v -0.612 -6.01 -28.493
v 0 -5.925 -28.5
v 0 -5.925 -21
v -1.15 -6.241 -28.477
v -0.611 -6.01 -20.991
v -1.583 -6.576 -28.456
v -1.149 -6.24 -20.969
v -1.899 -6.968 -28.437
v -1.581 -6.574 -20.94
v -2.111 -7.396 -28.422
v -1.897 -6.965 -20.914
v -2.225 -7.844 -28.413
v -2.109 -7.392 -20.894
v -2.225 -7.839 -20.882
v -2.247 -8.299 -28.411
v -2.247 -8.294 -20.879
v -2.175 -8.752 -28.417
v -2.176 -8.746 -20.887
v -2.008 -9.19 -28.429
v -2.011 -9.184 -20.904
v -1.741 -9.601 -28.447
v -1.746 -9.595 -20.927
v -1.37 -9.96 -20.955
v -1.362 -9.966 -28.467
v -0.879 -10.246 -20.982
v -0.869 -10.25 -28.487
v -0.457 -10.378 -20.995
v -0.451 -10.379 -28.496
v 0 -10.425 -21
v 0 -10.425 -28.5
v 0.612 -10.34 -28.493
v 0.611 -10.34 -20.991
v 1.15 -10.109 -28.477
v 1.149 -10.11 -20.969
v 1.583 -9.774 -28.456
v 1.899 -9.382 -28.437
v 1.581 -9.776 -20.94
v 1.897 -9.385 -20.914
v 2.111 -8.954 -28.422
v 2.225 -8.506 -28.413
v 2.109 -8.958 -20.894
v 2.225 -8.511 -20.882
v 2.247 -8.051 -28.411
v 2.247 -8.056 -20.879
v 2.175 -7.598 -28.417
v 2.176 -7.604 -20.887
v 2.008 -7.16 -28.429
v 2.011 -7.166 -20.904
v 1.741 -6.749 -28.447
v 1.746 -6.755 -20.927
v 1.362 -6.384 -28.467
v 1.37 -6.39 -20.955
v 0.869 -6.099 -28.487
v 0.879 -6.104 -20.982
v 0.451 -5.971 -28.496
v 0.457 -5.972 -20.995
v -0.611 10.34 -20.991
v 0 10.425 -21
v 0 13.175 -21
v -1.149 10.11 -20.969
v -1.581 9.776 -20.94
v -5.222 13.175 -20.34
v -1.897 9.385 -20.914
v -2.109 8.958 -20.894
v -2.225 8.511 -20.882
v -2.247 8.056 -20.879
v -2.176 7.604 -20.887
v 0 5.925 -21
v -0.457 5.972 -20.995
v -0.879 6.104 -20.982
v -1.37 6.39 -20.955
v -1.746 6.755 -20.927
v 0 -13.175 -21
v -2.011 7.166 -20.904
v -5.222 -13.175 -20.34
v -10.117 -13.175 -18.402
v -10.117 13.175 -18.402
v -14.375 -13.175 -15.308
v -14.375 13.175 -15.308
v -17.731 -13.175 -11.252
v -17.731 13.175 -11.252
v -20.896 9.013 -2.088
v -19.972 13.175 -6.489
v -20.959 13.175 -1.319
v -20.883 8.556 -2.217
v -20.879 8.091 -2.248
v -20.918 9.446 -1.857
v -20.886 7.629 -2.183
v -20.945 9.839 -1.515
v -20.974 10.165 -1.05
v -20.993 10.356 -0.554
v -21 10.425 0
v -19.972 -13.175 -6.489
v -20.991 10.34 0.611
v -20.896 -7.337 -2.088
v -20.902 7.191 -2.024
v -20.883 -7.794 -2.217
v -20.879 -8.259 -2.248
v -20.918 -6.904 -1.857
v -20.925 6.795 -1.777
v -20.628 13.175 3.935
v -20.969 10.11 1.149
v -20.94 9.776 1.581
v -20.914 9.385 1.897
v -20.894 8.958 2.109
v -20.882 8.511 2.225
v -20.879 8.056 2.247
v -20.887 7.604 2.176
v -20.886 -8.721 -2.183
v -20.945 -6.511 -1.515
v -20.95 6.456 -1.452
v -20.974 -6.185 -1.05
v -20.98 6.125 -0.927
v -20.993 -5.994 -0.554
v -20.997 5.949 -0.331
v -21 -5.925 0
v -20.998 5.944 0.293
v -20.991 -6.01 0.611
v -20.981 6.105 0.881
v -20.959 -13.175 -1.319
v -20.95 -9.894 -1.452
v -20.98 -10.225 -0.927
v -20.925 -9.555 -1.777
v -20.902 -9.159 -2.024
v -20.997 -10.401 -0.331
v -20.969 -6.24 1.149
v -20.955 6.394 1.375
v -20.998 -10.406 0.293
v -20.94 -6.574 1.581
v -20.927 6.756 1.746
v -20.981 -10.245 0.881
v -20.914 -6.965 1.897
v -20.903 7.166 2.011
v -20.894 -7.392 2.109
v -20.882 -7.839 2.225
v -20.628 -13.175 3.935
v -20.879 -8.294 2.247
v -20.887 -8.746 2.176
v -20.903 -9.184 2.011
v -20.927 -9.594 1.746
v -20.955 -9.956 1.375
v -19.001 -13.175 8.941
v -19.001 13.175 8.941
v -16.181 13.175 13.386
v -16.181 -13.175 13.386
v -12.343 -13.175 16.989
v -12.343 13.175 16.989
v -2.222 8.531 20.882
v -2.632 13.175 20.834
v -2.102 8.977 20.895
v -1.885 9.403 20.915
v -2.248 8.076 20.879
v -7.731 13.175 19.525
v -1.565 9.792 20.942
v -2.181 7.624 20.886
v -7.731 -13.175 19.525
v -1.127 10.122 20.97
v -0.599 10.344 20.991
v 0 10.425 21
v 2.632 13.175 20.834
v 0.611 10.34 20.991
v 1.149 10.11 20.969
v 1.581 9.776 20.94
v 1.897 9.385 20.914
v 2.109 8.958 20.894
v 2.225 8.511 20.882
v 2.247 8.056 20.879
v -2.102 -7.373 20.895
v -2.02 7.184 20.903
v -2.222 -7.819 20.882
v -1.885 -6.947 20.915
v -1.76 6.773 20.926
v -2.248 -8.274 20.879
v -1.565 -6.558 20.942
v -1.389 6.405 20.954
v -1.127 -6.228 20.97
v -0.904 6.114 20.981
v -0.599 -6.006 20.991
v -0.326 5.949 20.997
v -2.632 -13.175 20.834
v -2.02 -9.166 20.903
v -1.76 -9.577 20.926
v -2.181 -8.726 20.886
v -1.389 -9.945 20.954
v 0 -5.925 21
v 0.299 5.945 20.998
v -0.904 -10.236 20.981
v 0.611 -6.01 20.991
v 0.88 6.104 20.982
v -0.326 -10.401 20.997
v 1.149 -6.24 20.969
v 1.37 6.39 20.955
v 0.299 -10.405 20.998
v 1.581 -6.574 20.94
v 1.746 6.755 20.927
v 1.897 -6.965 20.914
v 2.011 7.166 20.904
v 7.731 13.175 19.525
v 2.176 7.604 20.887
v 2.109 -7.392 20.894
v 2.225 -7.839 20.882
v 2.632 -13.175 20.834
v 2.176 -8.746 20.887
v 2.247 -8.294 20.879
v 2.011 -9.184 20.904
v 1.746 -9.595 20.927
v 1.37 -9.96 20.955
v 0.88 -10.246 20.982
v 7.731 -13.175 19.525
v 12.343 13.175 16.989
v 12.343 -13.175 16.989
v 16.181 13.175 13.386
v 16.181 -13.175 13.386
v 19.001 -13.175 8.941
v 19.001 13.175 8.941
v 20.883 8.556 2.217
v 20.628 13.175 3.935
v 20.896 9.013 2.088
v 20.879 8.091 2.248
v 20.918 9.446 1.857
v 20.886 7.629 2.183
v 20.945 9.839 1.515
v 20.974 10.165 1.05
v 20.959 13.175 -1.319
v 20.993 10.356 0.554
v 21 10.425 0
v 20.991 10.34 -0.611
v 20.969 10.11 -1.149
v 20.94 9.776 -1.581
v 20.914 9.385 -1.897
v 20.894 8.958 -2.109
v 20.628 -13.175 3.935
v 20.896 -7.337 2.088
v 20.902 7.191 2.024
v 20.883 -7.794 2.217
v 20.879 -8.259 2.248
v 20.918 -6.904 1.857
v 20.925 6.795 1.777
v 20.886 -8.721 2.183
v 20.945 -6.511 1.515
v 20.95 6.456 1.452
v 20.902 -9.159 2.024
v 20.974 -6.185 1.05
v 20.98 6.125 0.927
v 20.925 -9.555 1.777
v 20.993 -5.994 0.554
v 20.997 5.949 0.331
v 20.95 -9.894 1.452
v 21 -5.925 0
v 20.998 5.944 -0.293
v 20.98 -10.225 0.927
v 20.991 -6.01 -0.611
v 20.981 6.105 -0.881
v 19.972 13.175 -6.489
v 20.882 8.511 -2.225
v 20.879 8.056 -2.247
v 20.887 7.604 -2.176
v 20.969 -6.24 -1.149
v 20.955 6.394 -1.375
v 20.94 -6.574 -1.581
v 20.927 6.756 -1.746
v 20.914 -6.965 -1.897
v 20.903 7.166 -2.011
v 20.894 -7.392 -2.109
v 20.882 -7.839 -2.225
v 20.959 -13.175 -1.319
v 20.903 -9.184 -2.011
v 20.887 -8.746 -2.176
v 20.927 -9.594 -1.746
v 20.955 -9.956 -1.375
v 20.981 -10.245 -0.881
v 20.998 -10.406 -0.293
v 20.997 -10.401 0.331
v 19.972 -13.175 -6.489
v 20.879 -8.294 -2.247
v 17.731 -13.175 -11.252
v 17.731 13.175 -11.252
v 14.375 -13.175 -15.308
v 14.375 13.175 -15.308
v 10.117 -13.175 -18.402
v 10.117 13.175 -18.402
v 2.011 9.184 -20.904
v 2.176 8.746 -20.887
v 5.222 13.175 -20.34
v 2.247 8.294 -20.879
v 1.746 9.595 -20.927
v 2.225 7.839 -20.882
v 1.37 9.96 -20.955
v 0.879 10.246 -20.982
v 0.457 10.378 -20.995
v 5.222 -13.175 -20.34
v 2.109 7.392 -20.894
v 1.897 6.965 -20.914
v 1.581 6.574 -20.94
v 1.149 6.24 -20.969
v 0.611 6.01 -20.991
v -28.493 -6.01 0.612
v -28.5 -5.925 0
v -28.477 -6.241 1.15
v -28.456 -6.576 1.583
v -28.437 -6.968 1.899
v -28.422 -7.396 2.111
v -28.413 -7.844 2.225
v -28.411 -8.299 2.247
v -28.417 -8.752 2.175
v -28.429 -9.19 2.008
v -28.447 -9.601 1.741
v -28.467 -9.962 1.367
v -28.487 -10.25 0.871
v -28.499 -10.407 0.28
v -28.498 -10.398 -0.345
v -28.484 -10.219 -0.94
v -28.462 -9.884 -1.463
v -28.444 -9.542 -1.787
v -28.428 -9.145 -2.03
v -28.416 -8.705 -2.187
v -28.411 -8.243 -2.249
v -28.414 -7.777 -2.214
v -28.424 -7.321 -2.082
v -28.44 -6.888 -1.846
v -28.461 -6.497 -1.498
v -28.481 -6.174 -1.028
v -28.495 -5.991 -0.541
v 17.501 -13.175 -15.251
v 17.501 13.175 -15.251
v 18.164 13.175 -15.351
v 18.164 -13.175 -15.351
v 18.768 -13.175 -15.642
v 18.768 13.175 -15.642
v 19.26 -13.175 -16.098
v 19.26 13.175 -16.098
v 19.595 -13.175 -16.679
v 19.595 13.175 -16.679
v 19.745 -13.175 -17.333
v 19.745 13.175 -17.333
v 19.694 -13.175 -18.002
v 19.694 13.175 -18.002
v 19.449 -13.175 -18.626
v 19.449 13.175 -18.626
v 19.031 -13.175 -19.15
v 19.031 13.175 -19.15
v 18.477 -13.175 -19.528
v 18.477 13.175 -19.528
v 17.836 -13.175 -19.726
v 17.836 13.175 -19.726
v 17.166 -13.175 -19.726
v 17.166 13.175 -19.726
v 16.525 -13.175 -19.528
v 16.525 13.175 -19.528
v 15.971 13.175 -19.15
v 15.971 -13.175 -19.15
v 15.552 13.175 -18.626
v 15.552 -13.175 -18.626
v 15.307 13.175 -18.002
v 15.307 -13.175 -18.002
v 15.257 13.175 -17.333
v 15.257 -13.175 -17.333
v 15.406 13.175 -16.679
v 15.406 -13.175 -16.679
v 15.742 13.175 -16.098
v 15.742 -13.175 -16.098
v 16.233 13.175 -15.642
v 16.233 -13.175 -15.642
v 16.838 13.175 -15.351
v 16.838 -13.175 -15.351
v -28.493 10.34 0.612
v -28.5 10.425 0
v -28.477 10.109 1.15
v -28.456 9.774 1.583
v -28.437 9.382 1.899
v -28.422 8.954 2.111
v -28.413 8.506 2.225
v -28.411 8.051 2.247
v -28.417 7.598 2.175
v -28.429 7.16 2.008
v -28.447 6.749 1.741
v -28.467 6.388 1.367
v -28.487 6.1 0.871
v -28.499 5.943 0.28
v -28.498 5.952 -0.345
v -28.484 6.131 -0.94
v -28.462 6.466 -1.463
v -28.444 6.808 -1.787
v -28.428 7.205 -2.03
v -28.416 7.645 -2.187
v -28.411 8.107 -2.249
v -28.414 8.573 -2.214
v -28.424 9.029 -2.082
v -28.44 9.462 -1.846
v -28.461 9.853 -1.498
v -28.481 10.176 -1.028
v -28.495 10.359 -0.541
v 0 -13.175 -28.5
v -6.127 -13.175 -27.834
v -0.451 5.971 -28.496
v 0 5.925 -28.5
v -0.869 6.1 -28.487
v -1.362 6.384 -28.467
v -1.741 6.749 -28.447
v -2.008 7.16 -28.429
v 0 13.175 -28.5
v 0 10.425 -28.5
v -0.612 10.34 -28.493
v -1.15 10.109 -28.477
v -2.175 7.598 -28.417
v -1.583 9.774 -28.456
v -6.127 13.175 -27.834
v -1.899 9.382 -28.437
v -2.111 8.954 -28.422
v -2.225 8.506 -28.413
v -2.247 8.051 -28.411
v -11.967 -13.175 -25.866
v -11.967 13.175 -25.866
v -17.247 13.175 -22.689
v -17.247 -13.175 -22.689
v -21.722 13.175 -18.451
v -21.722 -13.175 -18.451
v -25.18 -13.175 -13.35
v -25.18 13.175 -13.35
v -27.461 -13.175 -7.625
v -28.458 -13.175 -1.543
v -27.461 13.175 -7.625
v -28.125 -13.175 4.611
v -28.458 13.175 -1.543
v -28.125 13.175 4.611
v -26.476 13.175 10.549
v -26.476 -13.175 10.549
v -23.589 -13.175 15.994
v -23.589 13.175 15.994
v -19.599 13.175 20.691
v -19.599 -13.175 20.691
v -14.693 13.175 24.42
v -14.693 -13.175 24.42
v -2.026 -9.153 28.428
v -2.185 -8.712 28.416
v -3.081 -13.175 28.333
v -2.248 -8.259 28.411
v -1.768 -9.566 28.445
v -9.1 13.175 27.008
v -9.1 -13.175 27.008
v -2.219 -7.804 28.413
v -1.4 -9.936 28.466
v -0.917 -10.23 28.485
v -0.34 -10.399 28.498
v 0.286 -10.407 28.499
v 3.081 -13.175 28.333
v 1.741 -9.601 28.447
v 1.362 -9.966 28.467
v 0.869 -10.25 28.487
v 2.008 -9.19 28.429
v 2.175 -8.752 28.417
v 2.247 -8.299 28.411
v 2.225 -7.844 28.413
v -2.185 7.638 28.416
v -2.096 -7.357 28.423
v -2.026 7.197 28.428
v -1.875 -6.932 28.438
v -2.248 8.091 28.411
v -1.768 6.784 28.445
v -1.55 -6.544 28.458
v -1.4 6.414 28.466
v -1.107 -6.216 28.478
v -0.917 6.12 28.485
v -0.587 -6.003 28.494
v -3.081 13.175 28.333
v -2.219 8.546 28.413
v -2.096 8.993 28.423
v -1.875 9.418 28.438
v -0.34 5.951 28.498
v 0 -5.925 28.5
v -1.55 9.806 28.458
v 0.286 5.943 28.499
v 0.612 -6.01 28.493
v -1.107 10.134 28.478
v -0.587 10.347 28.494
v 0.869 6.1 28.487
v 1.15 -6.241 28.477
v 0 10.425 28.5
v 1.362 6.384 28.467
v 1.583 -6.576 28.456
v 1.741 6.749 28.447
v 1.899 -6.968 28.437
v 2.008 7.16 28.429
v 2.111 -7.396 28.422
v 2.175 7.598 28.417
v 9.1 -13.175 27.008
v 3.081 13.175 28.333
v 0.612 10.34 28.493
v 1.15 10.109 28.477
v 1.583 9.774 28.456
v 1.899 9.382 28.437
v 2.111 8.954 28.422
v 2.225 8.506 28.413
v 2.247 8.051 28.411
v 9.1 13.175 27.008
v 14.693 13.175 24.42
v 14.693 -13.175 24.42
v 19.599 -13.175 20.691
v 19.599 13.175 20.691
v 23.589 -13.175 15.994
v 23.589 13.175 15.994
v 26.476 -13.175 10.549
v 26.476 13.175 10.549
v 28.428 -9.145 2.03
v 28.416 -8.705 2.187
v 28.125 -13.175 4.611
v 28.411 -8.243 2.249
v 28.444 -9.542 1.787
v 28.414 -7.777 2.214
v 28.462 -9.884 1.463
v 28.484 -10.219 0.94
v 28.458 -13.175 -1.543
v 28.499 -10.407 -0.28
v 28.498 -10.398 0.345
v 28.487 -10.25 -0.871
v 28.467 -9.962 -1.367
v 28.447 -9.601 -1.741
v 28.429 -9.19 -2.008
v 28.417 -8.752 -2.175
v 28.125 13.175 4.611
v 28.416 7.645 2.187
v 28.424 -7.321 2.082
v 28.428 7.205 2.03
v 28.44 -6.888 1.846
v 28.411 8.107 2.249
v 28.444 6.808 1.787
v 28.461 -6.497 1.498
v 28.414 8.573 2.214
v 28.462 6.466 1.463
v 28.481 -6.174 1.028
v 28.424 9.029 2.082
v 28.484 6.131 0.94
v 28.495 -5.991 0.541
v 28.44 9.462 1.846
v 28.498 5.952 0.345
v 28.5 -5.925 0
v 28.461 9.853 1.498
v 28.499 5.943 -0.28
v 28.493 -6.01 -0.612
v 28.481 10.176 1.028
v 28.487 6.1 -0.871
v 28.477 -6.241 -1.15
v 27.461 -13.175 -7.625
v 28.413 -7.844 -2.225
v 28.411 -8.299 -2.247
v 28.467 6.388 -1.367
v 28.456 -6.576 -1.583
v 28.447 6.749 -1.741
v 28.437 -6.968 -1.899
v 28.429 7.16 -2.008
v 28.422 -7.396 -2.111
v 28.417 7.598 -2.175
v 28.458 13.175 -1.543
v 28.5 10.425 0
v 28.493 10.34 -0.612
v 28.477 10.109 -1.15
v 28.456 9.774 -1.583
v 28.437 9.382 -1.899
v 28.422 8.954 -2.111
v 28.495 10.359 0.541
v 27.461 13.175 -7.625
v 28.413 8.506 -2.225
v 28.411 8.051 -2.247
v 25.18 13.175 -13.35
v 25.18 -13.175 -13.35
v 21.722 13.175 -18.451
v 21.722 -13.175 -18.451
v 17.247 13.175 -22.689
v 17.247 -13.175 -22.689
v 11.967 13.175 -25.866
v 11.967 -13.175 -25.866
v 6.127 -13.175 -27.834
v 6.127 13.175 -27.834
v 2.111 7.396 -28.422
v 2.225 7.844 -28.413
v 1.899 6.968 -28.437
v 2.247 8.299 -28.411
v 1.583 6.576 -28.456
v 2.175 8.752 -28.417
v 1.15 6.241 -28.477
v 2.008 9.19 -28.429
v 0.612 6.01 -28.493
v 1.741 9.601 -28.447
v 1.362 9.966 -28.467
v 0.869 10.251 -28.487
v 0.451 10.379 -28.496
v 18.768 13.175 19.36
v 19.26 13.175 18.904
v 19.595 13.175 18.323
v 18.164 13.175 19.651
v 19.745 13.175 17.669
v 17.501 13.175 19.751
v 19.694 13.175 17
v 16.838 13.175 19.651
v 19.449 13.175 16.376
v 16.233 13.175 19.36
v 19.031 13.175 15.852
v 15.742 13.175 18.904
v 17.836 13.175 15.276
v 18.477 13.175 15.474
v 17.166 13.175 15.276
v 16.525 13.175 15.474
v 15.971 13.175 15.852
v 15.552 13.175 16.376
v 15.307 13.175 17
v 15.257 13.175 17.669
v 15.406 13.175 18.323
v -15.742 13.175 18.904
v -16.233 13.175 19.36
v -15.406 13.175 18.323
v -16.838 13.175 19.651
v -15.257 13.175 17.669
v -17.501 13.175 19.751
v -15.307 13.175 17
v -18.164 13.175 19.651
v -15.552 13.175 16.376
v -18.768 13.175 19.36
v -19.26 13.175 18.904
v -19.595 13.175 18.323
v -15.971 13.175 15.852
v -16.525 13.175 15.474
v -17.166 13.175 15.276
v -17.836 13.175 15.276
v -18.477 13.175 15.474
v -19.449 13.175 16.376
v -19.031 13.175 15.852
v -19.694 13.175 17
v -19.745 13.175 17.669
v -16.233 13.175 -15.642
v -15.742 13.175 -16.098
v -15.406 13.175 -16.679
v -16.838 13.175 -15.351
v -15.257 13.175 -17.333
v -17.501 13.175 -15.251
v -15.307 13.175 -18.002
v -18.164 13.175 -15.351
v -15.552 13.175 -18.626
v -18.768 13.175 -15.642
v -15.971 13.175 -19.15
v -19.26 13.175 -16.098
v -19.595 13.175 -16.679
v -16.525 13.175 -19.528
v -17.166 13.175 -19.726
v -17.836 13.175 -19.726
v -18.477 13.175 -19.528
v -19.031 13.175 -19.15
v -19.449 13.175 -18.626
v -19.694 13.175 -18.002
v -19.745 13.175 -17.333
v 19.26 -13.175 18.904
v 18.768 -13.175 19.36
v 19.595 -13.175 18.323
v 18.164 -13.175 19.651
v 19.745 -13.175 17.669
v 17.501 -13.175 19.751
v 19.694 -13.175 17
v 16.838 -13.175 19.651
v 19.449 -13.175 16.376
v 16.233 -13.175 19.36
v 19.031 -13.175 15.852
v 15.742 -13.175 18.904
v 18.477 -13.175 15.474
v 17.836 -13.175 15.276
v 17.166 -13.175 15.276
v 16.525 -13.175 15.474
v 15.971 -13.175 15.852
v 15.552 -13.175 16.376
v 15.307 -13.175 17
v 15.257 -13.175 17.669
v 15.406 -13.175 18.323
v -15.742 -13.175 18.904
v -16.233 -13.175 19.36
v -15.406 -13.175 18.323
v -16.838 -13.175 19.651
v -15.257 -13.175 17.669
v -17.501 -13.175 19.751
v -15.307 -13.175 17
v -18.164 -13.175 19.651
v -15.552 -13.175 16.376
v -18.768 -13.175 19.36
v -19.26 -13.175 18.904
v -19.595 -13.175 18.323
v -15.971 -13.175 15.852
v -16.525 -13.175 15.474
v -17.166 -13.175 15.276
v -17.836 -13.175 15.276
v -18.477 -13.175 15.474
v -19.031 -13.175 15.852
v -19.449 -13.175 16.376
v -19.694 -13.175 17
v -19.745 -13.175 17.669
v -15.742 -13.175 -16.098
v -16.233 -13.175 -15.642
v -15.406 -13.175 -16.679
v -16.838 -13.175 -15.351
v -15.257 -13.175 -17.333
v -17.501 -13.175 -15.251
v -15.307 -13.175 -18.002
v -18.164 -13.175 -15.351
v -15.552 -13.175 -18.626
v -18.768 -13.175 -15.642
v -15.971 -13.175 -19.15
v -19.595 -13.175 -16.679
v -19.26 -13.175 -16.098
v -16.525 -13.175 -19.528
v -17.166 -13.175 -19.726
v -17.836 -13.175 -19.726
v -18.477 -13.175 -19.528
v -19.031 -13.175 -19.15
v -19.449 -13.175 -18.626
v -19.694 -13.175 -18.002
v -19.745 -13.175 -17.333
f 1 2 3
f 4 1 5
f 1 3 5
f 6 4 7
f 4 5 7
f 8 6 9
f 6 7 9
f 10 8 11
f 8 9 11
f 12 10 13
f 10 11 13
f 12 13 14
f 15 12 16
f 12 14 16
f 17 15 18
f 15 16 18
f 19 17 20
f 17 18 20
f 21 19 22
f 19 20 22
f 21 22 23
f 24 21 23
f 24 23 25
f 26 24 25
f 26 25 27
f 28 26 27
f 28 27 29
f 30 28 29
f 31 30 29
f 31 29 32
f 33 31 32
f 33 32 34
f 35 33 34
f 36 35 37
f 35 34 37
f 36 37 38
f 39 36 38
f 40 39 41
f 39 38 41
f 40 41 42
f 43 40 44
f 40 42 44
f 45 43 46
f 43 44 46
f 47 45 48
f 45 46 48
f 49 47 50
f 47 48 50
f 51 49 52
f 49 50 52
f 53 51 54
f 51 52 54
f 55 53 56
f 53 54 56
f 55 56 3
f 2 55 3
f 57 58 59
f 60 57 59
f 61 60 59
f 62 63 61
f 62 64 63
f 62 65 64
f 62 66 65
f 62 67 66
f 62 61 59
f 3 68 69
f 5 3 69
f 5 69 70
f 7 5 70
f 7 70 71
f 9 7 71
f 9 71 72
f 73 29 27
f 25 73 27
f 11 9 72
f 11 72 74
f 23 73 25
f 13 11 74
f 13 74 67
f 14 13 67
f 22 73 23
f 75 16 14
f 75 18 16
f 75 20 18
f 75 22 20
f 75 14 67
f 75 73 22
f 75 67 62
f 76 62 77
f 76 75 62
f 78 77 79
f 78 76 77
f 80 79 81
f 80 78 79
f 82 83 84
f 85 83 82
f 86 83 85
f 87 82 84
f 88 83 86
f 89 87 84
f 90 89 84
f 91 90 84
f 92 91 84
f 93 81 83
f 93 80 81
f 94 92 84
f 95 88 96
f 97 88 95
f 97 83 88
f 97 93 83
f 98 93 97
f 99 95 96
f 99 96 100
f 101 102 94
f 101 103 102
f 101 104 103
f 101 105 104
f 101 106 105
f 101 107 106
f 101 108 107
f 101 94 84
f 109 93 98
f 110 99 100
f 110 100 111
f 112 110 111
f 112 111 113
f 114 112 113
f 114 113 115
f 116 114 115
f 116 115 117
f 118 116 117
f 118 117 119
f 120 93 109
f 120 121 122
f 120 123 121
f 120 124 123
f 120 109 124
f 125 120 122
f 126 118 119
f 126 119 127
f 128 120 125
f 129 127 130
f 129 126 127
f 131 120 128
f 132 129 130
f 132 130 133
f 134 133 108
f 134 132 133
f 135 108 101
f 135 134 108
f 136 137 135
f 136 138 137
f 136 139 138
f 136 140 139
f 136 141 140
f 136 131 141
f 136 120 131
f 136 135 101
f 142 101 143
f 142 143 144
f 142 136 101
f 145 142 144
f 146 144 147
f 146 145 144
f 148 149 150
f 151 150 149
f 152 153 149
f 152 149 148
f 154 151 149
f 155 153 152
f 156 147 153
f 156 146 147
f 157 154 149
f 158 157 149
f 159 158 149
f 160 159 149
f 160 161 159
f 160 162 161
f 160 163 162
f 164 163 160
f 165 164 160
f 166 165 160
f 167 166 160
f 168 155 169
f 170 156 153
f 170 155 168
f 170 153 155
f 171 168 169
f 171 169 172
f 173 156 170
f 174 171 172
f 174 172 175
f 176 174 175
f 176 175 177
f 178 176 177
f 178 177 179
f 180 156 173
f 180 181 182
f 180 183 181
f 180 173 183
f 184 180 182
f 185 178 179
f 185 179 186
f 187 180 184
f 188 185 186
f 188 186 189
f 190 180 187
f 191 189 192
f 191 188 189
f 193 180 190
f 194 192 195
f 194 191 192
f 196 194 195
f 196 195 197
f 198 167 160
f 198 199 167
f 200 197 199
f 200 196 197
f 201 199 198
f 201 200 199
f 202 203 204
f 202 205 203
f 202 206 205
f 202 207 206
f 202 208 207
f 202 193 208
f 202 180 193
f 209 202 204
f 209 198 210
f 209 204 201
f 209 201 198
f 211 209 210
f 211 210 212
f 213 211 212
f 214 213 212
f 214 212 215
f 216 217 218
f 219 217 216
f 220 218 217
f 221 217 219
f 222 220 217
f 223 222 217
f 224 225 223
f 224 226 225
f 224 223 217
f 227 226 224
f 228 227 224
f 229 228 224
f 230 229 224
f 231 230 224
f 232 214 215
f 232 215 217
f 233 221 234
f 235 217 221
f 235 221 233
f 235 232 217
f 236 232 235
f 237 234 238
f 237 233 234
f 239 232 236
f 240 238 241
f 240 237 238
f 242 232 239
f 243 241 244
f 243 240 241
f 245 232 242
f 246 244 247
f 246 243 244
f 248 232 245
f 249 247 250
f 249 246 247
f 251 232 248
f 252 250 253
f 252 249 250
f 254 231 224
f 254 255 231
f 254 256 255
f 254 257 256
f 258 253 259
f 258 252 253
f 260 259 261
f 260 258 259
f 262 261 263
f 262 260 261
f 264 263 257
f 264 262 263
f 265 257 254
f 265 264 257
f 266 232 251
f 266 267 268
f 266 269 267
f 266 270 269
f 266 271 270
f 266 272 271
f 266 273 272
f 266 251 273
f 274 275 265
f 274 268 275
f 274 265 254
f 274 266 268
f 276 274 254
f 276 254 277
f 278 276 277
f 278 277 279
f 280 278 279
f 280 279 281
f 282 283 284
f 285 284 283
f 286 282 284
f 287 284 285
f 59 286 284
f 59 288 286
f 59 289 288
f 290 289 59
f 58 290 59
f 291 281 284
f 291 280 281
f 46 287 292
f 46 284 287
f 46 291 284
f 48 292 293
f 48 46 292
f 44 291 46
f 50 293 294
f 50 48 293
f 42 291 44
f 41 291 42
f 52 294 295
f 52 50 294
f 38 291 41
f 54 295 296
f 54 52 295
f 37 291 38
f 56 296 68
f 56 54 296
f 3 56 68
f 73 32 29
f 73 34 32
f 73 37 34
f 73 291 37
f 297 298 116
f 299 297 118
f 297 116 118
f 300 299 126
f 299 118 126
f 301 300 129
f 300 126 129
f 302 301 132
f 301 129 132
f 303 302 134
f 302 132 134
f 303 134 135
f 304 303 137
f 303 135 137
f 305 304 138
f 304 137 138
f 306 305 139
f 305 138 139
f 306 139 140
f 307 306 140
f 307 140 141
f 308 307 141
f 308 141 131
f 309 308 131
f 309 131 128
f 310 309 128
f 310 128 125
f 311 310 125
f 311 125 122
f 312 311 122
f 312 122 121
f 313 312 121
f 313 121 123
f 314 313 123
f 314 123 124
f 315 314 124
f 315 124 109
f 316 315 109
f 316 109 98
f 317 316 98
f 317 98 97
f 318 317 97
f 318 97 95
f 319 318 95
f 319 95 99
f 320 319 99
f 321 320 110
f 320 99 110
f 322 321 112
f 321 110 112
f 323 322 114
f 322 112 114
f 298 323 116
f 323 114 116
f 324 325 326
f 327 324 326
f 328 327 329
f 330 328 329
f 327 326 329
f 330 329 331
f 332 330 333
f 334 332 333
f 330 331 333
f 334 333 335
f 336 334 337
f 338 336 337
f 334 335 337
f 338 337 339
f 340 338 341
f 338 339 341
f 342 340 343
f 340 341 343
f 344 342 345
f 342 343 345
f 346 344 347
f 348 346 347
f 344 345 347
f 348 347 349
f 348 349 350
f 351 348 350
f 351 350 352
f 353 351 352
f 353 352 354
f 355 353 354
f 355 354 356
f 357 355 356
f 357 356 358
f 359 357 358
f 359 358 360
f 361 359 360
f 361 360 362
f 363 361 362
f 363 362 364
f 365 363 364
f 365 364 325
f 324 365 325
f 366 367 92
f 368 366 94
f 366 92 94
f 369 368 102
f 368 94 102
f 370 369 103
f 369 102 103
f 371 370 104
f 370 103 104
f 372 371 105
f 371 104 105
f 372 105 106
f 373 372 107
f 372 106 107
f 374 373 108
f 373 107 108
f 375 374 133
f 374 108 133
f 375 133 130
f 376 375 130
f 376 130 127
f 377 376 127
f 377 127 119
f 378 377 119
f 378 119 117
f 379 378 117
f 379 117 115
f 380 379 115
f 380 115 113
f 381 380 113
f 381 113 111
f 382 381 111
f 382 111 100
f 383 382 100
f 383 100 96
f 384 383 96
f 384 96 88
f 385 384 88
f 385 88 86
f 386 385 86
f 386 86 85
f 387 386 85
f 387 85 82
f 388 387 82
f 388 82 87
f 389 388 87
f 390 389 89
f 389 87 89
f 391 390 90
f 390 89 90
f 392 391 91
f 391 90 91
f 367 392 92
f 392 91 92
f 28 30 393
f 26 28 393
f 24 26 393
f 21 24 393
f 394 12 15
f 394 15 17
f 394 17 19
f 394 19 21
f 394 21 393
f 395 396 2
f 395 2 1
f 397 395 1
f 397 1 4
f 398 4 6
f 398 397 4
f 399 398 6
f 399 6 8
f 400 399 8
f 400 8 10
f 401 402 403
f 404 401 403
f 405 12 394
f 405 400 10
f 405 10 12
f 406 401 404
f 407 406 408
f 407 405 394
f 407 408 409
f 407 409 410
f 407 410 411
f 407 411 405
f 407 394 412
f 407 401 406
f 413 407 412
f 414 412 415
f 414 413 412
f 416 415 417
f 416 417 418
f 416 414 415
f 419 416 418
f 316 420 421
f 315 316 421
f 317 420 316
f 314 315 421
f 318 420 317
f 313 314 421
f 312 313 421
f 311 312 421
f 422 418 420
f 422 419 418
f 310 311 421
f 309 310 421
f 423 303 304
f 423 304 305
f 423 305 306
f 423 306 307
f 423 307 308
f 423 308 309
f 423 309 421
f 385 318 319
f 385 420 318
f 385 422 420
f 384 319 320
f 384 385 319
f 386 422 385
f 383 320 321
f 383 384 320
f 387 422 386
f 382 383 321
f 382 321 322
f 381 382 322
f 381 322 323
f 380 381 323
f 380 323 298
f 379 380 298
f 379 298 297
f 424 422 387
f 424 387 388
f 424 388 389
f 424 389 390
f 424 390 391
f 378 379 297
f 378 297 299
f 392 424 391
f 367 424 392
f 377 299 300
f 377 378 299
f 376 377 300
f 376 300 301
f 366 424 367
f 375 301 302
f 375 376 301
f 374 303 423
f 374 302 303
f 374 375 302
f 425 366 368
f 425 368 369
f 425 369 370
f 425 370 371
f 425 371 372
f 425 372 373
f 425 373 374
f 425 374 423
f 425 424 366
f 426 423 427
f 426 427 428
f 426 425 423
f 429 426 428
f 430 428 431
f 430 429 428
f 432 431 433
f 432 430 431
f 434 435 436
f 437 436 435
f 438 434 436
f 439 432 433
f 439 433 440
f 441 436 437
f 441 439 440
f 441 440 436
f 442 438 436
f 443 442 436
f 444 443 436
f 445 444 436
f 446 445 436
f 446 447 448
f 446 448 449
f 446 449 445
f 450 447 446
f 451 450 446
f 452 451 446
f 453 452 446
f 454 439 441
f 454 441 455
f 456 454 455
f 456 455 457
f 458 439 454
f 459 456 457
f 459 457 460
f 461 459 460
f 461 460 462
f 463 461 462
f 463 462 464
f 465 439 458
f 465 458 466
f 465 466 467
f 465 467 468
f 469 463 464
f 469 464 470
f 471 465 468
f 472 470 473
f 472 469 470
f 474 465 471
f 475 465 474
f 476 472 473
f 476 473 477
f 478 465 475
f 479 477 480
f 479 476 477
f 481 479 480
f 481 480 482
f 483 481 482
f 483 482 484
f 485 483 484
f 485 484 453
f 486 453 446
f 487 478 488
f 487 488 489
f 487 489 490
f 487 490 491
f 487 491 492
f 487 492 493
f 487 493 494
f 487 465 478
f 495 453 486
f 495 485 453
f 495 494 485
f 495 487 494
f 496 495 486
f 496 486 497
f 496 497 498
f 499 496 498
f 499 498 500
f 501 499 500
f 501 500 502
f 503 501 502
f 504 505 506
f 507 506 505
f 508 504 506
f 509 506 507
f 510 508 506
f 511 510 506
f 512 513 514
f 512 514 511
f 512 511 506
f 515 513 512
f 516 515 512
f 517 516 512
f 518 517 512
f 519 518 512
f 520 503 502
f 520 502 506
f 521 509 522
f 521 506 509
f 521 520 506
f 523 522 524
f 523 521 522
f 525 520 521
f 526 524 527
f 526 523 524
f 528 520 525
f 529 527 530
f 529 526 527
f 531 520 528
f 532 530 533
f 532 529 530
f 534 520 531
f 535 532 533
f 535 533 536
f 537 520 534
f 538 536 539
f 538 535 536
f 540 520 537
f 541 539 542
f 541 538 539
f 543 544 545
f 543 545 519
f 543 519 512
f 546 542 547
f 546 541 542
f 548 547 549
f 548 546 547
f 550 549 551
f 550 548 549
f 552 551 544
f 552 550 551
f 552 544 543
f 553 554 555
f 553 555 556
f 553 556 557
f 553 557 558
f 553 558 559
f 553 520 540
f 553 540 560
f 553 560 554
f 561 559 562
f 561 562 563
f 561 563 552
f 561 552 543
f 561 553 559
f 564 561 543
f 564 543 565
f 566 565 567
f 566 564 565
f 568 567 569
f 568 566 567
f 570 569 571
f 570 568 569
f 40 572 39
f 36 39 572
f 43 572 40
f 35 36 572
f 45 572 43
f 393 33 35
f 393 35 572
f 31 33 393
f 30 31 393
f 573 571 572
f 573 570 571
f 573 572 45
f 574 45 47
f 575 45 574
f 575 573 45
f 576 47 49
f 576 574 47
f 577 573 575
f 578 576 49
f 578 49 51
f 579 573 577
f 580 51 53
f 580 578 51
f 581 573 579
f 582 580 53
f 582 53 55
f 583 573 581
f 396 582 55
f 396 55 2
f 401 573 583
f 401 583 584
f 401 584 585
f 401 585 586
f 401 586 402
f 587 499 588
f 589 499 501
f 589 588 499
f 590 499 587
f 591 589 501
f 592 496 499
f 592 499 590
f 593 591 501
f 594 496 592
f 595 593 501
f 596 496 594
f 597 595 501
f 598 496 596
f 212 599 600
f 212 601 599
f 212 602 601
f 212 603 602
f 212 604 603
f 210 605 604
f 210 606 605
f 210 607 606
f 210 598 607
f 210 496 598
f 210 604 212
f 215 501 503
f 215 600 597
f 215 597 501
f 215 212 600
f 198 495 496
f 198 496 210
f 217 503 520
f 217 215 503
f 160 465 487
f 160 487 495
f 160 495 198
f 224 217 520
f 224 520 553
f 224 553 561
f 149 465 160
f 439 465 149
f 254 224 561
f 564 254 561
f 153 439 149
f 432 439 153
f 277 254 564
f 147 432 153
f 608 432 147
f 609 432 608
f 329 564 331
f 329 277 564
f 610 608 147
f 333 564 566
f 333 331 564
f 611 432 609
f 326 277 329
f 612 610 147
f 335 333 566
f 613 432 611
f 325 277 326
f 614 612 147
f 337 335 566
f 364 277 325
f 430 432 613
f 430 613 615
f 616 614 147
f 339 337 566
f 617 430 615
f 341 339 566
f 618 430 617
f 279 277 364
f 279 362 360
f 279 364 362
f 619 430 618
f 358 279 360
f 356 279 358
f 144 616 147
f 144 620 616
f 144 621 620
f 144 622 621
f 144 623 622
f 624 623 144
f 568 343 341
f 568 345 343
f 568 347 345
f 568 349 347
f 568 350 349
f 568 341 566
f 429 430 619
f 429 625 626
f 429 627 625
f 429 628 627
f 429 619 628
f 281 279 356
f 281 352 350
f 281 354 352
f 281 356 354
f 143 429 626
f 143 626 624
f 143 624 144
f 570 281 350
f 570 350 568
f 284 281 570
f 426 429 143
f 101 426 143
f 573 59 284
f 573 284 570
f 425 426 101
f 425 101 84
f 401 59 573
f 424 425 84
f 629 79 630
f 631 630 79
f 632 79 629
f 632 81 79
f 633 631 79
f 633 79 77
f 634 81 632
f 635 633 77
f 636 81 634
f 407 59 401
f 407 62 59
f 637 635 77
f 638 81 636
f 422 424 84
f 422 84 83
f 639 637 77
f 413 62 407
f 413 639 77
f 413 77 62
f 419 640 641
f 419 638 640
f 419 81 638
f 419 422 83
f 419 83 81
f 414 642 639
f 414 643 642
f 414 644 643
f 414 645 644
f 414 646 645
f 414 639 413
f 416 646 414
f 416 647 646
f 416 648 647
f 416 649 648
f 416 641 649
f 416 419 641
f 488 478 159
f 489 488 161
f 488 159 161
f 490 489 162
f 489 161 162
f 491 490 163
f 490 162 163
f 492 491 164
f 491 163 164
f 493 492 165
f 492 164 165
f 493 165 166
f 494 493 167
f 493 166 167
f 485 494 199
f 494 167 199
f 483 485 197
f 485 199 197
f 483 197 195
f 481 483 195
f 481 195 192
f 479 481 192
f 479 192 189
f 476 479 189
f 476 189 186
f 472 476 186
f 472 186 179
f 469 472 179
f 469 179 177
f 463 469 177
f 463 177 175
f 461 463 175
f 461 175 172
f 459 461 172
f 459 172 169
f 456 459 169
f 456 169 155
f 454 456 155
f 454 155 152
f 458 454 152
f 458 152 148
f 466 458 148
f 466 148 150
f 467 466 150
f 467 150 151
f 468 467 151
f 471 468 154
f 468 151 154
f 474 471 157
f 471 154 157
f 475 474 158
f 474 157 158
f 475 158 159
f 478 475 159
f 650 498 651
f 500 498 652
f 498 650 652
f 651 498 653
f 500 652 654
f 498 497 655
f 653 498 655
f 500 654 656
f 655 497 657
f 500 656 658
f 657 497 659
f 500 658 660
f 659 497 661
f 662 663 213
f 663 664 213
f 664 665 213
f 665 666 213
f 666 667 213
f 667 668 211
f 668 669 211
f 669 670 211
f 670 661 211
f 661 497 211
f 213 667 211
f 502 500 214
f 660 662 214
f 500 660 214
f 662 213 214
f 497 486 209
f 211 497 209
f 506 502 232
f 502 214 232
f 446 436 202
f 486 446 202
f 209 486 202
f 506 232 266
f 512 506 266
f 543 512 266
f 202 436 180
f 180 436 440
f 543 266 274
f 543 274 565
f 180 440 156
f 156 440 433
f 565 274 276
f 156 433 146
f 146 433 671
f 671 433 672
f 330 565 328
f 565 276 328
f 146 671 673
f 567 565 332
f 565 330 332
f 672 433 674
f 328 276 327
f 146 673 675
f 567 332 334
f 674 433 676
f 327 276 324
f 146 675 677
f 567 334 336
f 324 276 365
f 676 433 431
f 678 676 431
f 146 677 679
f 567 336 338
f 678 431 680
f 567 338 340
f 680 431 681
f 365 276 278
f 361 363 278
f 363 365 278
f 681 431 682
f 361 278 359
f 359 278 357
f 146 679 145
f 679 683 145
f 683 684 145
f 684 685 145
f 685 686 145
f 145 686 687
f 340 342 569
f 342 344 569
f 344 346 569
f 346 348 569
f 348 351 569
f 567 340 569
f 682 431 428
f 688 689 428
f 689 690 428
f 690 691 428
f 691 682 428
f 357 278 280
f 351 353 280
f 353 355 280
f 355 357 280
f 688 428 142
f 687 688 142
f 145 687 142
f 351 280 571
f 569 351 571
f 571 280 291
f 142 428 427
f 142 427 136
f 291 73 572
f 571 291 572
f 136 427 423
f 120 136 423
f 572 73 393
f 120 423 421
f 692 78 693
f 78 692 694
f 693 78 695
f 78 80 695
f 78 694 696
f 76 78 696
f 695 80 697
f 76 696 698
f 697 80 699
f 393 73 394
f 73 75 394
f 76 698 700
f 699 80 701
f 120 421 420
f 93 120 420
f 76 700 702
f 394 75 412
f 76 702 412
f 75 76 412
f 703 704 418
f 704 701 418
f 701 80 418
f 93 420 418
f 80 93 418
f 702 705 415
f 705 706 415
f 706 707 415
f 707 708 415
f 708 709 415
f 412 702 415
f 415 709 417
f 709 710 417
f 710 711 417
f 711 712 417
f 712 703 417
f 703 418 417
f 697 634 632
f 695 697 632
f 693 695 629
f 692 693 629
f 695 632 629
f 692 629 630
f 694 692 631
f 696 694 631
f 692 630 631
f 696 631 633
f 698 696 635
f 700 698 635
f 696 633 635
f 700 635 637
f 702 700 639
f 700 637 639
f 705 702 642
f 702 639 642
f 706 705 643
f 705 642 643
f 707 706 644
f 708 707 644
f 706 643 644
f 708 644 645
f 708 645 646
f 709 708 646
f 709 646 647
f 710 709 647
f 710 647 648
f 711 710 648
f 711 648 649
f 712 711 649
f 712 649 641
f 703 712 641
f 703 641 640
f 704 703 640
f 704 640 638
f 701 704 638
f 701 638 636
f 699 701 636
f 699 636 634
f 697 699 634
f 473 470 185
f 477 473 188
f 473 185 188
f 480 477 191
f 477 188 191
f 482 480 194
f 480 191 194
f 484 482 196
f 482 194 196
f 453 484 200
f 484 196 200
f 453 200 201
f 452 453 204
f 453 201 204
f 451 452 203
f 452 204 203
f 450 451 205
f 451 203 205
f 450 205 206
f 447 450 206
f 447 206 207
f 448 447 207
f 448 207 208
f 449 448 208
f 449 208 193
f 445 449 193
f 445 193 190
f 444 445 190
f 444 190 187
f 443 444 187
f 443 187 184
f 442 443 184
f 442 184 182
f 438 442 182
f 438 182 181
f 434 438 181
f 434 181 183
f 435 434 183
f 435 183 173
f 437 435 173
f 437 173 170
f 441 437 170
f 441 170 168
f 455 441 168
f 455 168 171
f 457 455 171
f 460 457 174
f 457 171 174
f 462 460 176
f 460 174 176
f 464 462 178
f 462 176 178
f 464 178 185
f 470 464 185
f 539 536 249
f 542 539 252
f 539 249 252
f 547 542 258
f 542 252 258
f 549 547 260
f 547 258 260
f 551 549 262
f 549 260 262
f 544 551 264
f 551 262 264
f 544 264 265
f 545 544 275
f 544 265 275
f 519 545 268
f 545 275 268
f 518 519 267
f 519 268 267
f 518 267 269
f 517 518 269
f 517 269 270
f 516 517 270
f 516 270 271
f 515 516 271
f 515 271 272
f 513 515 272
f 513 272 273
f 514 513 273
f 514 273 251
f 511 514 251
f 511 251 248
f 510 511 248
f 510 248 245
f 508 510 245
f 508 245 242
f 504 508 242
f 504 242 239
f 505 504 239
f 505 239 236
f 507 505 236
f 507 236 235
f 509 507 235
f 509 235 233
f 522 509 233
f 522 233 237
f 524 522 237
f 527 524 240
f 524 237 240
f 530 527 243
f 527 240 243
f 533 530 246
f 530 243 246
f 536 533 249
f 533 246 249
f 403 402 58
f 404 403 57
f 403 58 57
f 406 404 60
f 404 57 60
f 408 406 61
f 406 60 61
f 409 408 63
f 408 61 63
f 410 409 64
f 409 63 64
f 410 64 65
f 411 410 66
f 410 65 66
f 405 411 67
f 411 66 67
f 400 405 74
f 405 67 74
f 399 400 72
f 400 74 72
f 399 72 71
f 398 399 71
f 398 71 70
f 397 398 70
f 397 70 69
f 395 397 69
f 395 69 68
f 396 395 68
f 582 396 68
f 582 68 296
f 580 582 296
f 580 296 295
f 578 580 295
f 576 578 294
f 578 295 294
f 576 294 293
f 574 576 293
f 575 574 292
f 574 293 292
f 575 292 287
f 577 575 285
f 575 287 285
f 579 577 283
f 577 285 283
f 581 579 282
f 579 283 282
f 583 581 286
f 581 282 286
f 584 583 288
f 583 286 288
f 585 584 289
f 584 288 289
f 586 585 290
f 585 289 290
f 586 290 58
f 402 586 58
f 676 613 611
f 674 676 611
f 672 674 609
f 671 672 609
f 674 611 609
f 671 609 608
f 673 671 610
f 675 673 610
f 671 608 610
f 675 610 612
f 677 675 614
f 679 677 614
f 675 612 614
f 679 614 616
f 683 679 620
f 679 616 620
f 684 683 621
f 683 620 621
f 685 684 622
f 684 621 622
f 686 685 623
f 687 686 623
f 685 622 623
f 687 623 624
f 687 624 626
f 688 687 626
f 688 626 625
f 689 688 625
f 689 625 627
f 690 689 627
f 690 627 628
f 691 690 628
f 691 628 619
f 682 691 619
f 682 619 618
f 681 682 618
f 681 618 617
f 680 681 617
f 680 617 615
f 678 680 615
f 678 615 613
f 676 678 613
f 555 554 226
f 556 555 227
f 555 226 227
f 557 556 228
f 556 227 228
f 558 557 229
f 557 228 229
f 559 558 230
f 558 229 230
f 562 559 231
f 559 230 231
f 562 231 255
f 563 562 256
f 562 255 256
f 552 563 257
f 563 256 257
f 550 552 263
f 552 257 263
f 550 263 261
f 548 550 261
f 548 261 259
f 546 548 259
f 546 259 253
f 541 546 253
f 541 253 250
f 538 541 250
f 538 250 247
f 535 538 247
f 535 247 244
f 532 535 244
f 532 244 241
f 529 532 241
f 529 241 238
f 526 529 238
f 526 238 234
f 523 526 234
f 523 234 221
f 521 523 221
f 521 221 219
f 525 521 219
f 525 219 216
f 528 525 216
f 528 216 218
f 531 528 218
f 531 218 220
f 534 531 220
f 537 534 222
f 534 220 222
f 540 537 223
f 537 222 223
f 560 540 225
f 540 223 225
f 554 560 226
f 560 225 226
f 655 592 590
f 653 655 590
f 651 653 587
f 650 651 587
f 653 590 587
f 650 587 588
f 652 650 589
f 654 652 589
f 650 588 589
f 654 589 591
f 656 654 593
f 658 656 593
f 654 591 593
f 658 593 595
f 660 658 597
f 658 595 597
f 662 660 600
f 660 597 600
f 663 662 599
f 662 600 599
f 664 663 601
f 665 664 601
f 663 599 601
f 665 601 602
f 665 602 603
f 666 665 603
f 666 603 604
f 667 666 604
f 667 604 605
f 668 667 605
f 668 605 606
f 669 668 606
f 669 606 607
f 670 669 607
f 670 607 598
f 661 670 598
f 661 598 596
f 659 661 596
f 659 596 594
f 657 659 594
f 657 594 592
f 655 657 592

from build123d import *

# Parameters (mm, degrees)
SKETCH1_R           = 28.5
SKETCH1_R_2         = 21
BOSS_EXTRUDE1_DEPTH = 13.175
SKETCH2_R           = 2.25
CUT_EXTRUDE1_DEPTH  = 43.403780787
CIRPATTERN1_COUNT   = 4
SKETCH3_R           = 2.25
CUT_EXTRUDE2_DEPTH  = 49.154153681


with BuildPart() as part:
    # Sketch1 → Boss-Extrude1 (new, symmetric)
    with BuildSketch(Plane(origin=(0, 0, 0), x_dir=(1, 0, 0), z_dir=(0, 1, 0))):
        with Locations(Location((0, 0, 0), (0, 0, 90))):
            Circle(SKETCH1_R)
        with Locations(Location((0, 0, 0), (0, 0, 90))):
            Circle(SKETCH1_R_2, mode=Mode.SUBTRACT)
    extrude(amount=BOSS_EXTRUDE1_DEPTH, both=True)

    # Sketch2 → Cut-Extrude1 (cut, through all)
    with BuildSketch(Plane.XY):
        with Locations(Location((0, 8.175, 0), (0, 0, 90))):
            Circle(SKETCH2_R)
        with Locations(Location((0, -8.175, 0), (0, 0, 90))):
            Circle(SKETCH2_R)
    cut_extrude1 = extrude(amount=-CUT_EXTRUDE1_DEPTH, mode=Mode.SUBTRACT)

    # CirPattern1: Cut-Extrude1 ×4 about axis
    cirpattern1_axis = Axis((0, 13.175, 0), (0, -1, 0))
    for i in range(1, CIRPATTERN1_COUNT):
        add(cut_extrude1.rotate(cirpattern1_axis, i * 360 / CIRPATTERN1_COUNT), mode=Mode.SUBTRACT)

    # Sketch3 → Cut-Extrude2 (cut, through all)
    with BuildSketch(Plane(origin=(0, 13.175, 0), x_dir=(1, 0, 0), z_dir=(0, 1, 0))):
        with Locations(Location((17.500892834, 17.500892834, 0), (0, 0, 270))):
            Circle(SKETCH3_R)
        with Locations(Location((17.500892834, -17.500892834, 0), (0, 0, 270))):
            Circle(SKETCH3_R)
        with Locations(Location((-17.500892834, -17.500892834, 0), (0, 0, 270))):
            Circle(SKETCH3_R)
        with Locations(Location((-17.500892834, 17.500892834, 0), (0, 0, 270))):
            Circle(SKETCH3_R)
    extrude(amount=-CUT_EXTRUDE2_DEPTH, mode=Mode.SUBTRACT)


solid = part.part
